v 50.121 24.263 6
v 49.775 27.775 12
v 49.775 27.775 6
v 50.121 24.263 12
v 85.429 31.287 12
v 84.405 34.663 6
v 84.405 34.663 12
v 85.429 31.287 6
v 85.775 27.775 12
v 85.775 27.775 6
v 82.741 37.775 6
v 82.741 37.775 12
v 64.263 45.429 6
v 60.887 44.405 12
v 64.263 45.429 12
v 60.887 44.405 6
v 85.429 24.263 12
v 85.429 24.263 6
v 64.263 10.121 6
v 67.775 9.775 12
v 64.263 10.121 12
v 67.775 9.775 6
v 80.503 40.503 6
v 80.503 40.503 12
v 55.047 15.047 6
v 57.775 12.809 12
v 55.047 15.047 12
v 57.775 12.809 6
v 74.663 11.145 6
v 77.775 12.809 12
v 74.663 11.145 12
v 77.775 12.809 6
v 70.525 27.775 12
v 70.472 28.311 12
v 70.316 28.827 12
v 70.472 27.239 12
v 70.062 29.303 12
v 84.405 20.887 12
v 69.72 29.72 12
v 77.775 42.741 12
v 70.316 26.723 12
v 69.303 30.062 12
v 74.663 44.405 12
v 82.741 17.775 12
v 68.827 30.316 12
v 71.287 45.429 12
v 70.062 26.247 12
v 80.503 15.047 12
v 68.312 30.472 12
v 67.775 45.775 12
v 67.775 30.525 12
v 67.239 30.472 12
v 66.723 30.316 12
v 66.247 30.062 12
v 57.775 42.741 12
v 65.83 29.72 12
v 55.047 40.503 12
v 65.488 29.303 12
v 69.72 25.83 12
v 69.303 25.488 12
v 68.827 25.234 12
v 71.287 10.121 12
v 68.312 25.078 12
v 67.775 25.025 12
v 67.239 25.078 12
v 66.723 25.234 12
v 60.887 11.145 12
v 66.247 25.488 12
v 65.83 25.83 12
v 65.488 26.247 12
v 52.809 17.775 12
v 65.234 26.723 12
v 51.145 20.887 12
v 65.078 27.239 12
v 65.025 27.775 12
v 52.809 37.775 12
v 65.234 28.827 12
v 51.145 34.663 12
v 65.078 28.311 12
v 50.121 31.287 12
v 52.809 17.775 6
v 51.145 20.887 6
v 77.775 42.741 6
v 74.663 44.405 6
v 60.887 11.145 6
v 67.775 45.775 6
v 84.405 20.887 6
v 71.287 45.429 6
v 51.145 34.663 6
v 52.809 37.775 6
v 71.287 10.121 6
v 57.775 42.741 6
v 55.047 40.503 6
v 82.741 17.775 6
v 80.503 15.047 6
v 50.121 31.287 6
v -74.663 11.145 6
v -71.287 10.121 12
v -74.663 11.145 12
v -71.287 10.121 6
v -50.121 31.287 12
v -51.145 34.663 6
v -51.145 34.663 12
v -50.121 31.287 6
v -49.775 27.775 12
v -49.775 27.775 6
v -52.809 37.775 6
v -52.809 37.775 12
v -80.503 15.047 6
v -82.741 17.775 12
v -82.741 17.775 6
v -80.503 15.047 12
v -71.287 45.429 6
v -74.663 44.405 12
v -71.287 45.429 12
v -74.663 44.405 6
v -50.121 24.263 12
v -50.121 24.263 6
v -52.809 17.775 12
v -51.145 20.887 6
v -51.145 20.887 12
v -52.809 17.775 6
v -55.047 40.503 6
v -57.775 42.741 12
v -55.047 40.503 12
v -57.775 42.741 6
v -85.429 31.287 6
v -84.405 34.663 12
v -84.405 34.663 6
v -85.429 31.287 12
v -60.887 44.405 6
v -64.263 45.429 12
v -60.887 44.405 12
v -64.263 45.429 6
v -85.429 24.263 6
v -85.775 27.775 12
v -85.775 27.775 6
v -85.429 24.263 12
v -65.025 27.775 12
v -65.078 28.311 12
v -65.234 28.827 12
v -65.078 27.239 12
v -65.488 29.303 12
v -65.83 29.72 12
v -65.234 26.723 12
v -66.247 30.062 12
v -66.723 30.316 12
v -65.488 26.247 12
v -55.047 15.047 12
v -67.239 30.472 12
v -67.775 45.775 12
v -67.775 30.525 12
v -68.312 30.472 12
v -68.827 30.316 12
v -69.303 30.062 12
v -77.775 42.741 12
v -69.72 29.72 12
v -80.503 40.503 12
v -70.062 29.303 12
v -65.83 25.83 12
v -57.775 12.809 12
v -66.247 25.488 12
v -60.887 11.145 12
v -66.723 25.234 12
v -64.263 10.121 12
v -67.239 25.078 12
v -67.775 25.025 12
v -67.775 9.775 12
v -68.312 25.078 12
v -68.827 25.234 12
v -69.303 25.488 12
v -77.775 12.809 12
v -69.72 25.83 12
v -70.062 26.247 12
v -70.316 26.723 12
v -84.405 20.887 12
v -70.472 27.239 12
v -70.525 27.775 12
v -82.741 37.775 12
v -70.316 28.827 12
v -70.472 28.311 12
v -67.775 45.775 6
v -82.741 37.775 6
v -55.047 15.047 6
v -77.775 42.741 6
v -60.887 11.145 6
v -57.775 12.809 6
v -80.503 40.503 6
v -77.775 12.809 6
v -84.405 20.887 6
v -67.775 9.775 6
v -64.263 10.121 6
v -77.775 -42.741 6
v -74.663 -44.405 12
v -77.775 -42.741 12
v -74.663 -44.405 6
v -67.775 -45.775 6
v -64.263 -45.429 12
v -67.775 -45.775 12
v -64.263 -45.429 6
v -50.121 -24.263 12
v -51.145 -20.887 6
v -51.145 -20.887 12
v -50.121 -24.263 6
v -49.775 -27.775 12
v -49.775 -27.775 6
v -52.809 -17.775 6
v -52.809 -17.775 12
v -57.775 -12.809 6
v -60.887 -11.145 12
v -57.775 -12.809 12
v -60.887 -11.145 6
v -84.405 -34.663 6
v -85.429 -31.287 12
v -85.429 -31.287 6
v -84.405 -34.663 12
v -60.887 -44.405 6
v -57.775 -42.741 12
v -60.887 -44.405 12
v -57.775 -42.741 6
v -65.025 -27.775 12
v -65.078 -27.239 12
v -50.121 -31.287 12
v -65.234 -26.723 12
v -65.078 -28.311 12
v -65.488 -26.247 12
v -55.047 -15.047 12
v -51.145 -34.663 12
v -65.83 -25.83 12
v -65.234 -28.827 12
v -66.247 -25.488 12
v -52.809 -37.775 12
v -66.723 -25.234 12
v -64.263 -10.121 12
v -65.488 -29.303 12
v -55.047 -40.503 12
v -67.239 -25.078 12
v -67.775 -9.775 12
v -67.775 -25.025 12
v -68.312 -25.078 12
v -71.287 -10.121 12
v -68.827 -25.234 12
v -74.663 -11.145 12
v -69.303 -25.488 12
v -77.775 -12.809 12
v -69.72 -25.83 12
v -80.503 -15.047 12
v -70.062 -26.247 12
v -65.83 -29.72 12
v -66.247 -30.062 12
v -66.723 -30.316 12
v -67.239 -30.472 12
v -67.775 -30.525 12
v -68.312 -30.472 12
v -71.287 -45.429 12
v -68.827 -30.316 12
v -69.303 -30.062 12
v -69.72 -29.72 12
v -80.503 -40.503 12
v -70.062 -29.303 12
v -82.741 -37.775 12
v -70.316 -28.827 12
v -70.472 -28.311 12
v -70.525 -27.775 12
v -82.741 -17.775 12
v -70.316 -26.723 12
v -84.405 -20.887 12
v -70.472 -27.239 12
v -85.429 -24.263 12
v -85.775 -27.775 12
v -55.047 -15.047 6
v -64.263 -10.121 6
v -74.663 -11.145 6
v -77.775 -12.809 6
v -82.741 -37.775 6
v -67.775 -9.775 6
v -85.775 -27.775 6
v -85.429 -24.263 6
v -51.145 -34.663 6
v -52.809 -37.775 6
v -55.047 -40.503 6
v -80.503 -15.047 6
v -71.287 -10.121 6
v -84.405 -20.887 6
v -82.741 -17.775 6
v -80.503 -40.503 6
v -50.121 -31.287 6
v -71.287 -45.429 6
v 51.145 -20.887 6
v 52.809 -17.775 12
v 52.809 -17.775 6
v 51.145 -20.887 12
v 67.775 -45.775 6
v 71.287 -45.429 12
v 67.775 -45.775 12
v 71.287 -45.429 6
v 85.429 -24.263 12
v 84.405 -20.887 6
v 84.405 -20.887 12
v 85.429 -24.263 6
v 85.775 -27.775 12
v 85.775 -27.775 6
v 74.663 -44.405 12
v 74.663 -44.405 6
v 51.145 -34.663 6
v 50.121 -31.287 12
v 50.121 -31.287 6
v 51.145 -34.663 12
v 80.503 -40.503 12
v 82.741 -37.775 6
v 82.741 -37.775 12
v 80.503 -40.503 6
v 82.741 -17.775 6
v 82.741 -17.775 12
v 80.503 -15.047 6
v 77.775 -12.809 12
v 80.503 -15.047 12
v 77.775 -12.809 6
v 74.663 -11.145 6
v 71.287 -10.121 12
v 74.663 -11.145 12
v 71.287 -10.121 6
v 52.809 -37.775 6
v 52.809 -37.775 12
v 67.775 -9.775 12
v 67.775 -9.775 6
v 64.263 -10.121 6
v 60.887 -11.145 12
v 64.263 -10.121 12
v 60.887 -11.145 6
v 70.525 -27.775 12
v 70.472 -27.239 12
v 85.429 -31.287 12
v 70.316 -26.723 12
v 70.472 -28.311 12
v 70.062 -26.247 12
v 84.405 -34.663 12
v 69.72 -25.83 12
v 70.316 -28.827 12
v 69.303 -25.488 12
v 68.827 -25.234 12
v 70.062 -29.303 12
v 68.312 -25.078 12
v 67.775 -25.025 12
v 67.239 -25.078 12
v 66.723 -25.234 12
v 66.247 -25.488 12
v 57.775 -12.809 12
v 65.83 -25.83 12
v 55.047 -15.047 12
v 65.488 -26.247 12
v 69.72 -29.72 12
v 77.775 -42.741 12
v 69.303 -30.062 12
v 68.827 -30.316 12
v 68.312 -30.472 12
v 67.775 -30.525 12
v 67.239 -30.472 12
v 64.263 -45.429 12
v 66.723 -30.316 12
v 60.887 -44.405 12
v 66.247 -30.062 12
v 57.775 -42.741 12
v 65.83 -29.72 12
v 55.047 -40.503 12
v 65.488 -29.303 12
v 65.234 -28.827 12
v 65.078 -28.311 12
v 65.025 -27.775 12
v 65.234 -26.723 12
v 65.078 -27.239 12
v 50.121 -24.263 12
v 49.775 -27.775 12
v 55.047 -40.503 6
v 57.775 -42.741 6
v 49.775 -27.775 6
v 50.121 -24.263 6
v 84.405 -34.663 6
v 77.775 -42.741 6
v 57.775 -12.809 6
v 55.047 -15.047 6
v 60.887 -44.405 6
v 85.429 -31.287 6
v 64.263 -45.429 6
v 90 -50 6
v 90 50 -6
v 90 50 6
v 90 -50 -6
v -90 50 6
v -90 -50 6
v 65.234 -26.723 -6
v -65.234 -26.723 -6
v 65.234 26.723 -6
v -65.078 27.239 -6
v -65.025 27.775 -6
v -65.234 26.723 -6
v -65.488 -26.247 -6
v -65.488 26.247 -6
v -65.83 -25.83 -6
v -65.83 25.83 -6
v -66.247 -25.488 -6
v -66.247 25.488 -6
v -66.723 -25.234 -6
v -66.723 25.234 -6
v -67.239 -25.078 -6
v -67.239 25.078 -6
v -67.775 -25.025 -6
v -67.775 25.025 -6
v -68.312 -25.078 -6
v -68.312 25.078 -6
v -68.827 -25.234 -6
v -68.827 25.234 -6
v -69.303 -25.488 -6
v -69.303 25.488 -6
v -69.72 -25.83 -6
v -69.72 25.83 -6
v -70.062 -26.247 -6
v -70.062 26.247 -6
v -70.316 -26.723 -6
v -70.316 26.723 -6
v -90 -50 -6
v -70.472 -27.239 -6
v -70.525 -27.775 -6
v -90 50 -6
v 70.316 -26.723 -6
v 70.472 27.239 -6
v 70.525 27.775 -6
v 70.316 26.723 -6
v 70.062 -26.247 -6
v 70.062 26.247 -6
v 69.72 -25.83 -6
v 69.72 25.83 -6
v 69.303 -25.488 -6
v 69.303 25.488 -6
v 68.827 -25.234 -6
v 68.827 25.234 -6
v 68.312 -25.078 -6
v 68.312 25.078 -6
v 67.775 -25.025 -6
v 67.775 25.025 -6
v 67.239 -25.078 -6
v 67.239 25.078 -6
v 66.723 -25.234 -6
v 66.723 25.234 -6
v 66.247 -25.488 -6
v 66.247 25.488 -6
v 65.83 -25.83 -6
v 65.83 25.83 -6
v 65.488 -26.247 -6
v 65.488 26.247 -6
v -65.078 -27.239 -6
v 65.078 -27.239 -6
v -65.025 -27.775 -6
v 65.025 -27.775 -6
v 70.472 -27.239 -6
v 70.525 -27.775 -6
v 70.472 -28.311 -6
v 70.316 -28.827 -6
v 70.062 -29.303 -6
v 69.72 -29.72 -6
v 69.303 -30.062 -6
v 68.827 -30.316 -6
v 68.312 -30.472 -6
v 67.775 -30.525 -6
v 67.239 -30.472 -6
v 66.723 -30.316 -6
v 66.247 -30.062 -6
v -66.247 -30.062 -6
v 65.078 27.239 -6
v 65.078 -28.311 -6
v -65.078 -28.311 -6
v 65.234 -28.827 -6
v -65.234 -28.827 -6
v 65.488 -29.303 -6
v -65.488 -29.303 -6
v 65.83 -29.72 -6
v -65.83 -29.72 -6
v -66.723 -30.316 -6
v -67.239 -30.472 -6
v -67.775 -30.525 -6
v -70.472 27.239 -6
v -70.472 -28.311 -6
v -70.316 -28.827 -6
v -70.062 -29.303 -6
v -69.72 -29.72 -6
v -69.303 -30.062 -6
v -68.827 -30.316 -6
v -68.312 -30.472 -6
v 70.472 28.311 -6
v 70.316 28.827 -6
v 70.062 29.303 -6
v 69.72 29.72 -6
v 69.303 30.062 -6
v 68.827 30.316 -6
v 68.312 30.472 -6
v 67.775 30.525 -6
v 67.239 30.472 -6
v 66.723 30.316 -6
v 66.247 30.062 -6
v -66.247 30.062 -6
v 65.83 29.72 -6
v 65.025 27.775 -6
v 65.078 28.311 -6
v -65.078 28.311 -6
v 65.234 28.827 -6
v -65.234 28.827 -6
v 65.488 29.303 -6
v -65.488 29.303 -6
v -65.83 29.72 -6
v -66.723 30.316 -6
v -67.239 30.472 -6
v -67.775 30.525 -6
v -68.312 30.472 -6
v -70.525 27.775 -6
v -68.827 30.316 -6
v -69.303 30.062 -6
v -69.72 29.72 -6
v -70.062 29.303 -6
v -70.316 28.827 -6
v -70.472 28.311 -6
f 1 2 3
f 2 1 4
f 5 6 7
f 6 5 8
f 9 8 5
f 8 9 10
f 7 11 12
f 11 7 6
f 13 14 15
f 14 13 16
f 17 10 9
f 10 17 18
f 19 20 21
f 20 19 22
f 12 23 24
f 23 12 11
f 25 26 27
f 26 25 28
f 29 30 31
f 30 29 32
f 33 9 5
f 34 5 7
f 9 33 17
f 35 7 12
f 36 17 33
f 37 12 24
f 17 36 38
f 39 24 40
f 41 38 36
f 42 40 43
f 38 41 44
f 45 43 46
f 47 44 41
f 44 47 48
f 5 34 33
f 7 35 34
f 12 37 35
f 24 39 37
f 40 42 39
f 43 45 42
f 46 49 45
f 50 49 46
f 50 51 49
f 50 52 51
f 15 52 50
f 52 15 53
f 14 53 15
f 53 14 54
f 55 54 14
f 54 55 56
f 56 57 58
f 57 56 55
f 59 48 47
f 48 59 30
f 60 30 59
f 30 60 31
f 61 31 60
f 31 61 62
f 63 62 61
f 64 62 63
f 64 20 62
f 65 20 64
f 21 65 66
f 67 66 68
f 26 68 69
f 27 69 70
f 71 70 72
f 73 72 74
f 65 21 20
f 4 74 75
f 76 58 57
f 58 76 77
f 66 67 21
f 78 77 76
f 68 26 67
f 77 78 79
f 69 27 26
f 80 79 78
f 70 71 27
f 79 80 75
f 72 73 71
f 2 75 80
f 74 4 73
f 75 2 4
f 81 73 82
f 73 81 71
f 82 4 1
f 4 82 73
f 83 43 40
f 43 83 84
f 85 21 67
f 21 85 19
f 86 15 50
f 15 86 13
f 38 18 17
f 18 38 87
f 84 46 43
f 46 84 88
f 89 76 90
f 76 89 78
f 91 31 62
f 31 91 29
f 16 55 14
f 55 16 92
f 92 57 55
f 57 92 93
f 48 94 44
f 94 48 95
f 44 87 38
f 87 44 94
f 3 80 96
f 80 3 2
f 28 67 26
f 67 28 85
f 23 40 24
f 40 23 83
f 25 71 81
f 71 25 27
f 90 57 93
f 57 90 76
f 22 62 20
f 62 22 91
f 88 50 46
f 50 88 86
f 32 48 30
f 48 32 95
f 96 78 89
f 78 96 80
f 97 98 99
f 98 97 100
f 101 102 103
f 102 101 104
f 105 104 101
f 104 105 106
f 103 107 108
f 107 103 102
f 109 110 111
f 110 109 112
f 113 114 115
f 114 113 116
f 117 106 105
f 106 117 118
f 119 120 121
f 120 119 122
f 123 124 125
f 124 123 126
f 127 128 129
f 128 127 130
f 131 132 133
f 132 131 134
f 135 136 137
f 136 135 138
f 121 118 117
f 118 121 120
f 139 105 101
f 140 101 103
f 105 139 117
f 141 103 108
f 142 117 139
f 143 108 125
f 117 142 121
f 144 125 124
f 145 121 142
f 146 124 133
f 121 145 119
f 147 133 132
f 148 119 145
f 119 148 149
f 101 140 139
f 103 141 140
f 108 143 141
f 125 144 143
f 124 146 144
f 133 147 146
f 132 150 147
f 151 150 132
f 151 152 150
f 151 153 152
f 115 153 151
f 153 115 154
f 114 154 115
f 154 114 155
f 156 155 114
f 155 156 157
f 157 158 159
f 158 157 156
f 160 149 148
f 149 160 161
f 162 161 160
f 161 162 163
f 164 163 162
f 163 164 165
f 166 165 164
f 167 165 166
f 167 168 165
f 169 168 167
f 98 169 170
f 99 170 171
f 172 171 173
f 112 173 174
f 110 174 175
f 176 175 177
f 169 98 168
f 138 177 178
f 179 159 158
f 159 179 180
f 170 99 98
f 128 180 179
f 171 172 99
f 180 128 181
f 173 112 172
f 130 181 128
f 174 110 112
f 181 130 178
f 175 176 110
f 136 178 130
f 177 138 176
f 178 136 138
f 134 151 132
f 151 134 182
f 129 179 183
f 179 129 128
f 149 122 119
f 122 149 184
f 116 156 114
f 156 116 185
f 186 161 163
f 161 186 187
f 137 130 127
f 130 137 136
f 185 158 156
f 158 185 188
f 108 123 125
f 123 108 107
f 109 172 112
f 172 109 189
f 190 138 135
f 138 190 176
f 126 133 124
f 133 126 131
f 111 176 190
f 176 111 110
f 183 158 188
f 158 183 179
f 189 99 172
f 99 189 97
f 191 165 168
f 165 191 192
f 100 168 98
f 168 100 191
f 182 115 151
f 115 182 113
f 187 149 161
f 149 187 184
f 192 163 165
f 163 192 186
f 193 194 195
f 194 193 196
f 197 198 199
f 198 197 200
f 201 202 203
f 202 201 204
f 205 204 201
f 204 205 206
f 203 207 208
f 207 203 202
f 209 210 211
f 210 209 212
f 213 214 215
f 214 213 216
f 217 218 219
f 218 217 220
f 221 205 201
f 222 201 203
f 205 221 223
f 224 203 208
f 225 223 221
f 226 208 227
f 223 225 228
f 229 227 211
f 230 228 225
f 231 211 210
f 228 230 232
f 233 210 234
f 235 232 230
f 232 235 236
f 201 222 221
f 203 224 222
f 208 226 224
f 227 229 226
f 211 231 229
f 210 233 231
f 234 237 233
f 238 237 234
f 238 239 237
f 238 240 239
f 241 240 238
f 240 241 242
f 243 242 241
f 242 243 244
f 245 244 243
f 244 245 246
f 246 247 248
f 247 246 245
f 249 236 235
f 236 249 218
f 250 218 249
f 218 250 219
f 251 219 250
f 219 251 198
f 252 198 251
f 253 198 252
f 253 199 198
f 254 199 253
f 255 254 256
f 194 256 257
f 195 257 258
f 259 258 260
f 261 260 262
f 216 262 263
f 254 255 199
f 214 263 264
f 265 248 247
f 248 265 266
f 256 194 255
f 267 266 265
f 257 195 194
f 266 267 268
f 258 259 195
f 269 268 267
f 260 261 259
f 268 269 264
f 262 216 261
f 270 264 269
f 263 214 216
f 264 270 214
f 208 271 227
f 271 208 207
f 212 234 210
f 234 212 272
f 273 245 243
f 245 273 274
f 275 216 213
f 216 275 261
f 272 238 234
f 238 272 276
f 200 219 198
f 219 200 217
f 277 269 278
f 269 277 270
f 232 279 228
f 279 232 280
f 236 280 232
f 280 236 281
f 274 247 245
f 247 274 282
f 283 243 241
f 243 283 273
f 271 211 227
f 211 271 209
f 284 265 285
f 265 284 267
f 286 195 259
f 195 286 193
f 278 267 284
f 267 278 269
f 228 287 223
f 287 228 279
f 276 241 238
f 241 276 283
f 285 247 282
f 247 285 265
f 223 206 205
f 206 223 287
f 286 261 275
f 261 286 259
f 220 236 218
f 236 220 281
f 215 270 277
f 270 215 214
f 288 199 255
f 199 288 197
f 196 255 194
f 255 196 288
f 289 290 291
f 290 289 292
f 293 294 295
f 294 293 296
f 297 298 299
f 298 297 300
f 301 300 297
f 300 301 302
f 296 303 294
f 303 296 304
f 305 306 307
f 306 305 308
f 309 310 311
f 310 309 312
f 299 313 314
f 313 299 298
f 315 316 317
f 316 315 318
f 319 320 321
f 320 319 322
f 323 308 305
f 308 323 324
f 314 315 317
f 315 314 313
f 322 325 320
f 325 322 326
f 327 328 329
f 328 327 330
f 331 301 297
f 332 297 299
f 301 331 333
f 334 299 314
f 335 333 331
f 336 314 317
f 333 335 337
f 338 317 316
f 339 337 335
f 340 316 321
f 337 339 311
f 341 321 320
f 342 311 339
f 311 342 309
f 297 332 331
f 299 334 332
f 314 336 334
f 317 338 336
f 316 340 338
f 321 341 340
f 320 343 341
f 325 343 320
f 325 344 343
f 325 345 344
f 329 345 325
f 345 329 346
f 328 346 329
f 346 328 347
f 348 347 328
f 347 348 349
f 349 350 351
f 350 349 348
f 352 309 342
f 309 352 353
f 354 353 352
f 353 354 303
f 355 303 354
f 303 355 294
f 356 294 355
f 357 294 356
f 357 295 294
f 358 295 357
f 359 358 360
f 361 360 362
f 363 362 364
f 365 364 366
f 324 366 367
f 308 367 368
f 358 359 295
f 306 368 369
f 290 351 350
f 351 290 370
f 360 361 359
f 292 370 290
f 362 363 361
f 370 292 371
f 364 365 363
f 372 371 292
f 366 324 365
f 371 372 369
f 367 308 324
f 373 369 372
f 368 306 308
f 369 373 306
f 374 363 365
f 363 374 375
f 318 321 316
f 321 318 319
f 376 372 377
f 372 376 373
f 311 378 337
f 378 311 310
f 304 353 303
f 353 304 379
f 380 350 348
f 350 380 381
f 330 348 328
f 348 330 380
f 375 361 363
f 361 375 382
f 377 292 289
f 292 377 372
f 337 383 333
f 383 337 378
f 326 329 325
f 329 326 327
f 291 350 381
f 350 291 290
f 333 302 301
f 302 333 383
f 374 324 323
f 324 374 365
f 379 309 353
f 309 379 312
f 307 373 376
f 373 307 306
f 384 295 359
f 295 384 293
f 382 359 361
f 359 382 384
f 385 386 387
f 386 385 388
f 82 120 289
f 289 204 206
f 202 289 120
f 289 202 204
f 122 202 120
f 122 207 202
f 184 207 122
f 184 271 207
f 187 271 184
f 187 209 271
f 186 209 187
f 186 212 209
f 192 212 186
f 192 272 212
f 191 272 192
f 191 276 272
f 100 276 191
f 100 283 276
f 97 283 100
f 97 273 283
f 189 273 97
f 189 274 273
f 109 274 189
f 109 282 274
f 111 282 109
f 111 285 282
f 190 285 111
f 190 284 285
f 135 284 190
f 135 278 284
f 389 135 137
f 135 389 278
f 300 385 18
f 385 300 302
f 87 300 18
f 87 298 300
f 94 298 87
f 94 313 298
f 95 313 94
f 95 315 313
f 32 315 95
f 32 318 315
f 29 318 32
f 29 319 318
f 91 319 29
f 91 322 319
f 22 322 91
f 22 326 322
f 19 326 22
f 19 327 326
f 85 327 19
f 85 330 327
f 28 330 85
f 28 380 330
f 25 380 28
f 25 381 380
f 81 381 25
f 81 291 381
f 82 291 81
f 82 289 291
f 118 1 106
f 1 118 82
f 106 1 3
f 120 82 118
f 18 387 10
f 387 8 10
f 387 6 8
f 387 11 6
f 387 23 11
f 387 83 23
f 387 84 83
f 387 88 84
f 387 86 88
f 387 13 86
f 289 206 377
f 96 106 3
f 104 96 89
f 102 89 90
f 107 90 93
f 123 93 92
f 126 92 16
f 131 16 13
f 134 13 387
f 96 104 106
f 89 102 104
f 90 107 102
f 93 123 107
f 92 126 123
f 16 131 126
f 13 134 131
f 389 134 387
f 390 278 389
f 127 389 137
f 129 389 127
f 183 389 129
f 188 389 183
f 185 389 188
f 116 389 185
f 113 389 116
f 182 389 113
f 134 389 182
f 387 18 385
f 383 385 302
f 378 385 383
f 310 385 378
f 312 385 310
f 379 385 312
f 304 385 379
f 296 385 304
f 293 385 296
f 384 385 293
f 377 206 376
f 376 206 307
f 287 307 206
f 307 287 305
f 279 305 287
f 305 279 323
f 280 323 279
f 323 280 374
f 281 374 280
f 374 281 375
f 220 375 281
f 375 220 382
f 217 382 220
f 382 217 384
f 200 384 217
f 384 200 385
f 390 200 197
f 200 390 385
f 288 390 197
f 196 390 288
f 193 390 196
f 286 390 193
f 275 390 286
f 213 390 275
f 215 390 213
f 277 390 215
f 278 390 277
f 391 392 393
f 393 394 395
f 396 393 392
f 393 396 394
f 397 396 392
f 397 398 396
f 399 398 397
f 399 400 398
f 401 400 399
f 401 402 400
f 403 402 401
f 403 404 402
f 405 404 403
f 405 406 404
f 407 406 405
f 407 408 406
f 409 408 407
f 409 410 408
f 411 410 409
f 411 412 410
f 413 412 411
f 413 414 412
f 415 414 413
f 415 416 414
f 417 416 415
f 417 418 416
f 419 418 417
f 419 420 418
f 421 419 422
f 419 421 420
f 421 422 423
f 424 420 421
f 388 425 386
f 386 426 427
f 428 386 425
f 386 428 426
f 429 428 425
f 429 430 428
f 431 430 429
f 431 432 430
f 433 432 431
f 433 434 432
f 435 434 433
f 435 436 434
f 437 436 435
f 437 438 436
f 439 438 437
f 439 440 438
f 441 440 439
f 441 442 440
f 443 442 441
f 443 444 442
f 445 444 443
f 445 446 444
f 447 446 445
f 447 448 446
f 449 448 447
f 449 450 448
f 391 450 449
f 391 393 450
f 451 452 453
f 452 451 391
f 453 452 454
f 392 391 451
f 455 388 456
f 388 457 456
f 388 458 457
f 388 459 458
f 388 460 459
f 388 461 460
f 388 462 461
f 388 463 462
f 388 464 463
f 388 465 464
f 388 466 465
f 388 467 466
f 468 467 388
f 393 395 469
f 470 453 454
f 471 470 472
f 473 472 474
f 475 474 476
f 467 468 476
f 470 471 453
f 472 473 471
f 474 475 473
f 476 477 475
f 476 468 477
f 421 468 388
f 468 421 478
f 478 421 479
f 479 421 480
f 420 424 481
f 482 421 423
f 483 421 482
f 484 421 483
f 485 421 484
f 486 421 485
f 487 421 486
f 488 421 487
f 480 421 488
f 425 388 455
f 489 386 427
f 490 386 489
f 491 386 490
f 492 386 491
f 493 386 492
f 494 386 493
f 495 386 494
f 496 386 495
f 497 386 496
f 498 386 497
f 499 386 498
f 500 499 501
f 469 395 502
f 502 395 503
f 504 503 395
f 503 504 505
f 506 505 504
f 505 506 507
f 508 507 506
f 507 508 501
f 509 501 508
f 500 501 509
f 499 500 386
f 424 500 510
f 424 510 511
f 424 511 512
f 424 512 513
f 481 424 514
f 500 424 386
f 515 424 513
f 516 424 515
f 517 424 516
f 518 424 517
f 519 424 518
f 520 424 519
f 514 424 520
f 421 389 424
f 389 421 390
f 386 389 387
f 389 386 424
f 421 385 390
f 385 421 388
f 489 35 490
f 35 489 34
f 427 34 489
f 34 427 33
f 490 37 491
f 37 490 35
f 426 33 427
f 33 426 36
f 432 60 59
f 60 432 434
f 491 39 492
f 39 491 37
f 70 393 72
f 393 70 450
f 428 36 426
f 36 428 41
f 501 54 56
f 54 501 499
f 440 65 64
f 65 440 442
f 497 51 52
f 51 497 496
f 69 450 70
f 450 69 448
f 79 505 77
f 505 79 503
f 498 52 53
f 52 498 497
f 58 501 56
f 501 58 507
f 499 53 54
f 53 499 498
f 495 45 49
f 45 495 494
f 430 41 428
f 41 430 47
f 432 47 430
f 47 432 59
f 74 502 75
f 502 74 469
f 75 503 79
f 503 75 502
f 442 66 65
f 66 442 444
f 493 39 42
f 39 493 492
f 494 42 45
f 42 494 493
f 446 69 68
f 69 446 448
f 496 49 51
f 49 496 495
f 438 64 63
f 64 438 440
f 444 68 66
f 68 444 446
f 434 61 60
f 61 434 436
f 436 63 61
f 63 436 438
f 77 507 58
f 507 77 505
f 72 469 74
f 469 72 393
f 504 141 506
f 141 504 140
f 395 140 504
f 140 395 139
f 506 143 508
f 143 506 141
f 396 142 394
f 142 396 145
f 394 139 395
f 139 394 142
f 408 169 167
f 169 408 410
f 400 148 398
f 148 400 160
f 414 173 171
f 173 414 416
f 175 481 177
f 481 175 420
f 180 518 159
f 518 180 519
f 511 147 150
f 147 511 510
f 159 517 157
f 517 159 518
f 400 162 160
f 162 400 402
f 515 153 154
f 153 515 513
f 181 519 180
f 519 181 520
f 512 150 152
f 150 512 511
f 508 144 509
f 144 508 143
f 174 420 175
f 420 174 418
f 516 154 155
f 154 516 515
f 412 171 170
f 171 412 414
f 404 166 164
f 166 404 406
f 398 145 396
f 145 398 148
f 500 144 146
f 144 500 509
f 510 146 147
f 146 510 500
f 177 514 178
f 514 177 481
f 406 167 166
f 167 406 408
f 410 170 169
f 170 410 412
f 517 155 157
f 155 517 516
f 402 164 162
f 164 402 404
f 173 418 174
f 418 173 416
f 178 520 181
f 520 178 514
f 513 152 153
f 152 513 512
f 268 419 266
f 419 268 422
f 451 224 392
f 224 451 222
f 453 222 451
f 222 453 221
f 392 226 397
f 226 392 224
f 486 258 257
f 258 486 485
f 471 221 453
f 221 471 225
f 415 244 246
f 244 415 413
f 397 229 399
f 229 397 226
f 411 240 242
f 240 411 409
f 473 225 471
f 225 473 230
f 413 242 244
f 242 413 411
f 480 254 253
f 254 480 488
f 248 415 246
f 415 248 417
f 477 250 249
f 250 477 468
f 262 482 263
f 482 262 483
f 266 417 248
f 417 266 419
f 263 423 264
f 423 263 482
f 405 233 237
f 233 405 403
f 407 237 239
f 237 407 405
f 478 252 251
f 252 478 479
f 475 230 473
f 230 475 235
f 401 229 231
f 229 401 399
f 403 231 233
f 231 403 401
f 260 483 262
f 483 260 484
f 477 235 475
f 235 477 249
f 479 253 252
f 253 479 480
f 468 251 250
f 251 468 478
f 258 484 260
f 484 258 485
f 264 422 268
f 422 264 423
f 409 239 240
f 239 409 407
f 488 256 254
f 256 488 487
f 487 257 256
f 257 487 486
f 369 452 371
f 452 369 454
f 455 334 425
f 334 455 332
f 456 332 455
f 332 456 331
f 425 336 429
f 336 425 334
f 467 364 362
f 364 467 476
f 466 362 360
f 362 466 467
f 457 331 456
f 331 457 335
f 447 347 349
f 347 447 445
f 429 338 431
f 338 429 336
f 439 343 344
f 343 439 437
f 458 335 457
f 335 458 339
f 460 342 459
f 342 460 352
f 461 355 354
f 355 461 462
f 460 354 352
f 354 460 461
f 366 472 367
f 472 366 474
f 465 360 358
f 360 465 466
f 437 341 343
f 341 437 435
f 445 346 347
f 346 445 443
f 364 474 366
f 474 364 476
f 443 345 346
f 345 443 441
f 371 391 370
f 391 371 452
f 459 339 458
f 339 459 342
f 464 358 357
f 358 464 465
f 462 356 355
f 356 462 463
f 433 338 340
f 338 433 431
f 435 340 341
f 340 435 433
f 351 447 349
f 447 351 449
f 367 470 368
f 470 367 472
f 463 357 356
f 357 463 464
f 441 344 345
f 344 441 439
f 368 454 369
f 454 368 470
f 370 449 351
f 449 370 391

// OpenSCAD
$fn = 32;

// ----------------------------------------------------------------------
// Anchor pads 180 x 100 x 18
// four corner bosses with anchor holes
// ----------------------------------------------------------------------

// --- parameters (mm) ---
plate = [180, 100, 12];  // base plate size (x, y, z)
pads = 4;                // boss count, one per corner
edge = 22.225;           // boss centre offset from the plate edge
boss_d = 36;             // boss diameter
boss_h = 6;              // boss height above the base plate
hole_d = 5.5;            // hole diameter

// --- derived feature positions (mm) ---
height = plate[2] + boss_h;      // = 18   overall height of the part
corner_x = plate[0] / 2 - edge;  // = 67.78   boss centre X
corner_y = plate[1] / 2 - edge;  // = 27.77   boss centre Y
feature_centers = [
  [corner_x, corner_y],
  [-corner_x, corner_y],
  [-corner_x, -corner_y],
  [corner_x, -corner_y]
];   // boss centres, anchor holes are drilled there

// base plate, four bosses standing on it, anchor holes all the way through
difference() {
  union() {
    cube(plate, center = true);
    for (centre = feature_centers)
      translate([centre[0], centre[1], plate[2] / 2 - 1])
        cylinder(d = boss_d, h = boss_h + 1);
  }
  for (centre = feature_centers)
    translate([centre[0], centre[1], -height])
      cylinder(d = hole_d, h = 2 * height + 2);  // through boss and plate
}
